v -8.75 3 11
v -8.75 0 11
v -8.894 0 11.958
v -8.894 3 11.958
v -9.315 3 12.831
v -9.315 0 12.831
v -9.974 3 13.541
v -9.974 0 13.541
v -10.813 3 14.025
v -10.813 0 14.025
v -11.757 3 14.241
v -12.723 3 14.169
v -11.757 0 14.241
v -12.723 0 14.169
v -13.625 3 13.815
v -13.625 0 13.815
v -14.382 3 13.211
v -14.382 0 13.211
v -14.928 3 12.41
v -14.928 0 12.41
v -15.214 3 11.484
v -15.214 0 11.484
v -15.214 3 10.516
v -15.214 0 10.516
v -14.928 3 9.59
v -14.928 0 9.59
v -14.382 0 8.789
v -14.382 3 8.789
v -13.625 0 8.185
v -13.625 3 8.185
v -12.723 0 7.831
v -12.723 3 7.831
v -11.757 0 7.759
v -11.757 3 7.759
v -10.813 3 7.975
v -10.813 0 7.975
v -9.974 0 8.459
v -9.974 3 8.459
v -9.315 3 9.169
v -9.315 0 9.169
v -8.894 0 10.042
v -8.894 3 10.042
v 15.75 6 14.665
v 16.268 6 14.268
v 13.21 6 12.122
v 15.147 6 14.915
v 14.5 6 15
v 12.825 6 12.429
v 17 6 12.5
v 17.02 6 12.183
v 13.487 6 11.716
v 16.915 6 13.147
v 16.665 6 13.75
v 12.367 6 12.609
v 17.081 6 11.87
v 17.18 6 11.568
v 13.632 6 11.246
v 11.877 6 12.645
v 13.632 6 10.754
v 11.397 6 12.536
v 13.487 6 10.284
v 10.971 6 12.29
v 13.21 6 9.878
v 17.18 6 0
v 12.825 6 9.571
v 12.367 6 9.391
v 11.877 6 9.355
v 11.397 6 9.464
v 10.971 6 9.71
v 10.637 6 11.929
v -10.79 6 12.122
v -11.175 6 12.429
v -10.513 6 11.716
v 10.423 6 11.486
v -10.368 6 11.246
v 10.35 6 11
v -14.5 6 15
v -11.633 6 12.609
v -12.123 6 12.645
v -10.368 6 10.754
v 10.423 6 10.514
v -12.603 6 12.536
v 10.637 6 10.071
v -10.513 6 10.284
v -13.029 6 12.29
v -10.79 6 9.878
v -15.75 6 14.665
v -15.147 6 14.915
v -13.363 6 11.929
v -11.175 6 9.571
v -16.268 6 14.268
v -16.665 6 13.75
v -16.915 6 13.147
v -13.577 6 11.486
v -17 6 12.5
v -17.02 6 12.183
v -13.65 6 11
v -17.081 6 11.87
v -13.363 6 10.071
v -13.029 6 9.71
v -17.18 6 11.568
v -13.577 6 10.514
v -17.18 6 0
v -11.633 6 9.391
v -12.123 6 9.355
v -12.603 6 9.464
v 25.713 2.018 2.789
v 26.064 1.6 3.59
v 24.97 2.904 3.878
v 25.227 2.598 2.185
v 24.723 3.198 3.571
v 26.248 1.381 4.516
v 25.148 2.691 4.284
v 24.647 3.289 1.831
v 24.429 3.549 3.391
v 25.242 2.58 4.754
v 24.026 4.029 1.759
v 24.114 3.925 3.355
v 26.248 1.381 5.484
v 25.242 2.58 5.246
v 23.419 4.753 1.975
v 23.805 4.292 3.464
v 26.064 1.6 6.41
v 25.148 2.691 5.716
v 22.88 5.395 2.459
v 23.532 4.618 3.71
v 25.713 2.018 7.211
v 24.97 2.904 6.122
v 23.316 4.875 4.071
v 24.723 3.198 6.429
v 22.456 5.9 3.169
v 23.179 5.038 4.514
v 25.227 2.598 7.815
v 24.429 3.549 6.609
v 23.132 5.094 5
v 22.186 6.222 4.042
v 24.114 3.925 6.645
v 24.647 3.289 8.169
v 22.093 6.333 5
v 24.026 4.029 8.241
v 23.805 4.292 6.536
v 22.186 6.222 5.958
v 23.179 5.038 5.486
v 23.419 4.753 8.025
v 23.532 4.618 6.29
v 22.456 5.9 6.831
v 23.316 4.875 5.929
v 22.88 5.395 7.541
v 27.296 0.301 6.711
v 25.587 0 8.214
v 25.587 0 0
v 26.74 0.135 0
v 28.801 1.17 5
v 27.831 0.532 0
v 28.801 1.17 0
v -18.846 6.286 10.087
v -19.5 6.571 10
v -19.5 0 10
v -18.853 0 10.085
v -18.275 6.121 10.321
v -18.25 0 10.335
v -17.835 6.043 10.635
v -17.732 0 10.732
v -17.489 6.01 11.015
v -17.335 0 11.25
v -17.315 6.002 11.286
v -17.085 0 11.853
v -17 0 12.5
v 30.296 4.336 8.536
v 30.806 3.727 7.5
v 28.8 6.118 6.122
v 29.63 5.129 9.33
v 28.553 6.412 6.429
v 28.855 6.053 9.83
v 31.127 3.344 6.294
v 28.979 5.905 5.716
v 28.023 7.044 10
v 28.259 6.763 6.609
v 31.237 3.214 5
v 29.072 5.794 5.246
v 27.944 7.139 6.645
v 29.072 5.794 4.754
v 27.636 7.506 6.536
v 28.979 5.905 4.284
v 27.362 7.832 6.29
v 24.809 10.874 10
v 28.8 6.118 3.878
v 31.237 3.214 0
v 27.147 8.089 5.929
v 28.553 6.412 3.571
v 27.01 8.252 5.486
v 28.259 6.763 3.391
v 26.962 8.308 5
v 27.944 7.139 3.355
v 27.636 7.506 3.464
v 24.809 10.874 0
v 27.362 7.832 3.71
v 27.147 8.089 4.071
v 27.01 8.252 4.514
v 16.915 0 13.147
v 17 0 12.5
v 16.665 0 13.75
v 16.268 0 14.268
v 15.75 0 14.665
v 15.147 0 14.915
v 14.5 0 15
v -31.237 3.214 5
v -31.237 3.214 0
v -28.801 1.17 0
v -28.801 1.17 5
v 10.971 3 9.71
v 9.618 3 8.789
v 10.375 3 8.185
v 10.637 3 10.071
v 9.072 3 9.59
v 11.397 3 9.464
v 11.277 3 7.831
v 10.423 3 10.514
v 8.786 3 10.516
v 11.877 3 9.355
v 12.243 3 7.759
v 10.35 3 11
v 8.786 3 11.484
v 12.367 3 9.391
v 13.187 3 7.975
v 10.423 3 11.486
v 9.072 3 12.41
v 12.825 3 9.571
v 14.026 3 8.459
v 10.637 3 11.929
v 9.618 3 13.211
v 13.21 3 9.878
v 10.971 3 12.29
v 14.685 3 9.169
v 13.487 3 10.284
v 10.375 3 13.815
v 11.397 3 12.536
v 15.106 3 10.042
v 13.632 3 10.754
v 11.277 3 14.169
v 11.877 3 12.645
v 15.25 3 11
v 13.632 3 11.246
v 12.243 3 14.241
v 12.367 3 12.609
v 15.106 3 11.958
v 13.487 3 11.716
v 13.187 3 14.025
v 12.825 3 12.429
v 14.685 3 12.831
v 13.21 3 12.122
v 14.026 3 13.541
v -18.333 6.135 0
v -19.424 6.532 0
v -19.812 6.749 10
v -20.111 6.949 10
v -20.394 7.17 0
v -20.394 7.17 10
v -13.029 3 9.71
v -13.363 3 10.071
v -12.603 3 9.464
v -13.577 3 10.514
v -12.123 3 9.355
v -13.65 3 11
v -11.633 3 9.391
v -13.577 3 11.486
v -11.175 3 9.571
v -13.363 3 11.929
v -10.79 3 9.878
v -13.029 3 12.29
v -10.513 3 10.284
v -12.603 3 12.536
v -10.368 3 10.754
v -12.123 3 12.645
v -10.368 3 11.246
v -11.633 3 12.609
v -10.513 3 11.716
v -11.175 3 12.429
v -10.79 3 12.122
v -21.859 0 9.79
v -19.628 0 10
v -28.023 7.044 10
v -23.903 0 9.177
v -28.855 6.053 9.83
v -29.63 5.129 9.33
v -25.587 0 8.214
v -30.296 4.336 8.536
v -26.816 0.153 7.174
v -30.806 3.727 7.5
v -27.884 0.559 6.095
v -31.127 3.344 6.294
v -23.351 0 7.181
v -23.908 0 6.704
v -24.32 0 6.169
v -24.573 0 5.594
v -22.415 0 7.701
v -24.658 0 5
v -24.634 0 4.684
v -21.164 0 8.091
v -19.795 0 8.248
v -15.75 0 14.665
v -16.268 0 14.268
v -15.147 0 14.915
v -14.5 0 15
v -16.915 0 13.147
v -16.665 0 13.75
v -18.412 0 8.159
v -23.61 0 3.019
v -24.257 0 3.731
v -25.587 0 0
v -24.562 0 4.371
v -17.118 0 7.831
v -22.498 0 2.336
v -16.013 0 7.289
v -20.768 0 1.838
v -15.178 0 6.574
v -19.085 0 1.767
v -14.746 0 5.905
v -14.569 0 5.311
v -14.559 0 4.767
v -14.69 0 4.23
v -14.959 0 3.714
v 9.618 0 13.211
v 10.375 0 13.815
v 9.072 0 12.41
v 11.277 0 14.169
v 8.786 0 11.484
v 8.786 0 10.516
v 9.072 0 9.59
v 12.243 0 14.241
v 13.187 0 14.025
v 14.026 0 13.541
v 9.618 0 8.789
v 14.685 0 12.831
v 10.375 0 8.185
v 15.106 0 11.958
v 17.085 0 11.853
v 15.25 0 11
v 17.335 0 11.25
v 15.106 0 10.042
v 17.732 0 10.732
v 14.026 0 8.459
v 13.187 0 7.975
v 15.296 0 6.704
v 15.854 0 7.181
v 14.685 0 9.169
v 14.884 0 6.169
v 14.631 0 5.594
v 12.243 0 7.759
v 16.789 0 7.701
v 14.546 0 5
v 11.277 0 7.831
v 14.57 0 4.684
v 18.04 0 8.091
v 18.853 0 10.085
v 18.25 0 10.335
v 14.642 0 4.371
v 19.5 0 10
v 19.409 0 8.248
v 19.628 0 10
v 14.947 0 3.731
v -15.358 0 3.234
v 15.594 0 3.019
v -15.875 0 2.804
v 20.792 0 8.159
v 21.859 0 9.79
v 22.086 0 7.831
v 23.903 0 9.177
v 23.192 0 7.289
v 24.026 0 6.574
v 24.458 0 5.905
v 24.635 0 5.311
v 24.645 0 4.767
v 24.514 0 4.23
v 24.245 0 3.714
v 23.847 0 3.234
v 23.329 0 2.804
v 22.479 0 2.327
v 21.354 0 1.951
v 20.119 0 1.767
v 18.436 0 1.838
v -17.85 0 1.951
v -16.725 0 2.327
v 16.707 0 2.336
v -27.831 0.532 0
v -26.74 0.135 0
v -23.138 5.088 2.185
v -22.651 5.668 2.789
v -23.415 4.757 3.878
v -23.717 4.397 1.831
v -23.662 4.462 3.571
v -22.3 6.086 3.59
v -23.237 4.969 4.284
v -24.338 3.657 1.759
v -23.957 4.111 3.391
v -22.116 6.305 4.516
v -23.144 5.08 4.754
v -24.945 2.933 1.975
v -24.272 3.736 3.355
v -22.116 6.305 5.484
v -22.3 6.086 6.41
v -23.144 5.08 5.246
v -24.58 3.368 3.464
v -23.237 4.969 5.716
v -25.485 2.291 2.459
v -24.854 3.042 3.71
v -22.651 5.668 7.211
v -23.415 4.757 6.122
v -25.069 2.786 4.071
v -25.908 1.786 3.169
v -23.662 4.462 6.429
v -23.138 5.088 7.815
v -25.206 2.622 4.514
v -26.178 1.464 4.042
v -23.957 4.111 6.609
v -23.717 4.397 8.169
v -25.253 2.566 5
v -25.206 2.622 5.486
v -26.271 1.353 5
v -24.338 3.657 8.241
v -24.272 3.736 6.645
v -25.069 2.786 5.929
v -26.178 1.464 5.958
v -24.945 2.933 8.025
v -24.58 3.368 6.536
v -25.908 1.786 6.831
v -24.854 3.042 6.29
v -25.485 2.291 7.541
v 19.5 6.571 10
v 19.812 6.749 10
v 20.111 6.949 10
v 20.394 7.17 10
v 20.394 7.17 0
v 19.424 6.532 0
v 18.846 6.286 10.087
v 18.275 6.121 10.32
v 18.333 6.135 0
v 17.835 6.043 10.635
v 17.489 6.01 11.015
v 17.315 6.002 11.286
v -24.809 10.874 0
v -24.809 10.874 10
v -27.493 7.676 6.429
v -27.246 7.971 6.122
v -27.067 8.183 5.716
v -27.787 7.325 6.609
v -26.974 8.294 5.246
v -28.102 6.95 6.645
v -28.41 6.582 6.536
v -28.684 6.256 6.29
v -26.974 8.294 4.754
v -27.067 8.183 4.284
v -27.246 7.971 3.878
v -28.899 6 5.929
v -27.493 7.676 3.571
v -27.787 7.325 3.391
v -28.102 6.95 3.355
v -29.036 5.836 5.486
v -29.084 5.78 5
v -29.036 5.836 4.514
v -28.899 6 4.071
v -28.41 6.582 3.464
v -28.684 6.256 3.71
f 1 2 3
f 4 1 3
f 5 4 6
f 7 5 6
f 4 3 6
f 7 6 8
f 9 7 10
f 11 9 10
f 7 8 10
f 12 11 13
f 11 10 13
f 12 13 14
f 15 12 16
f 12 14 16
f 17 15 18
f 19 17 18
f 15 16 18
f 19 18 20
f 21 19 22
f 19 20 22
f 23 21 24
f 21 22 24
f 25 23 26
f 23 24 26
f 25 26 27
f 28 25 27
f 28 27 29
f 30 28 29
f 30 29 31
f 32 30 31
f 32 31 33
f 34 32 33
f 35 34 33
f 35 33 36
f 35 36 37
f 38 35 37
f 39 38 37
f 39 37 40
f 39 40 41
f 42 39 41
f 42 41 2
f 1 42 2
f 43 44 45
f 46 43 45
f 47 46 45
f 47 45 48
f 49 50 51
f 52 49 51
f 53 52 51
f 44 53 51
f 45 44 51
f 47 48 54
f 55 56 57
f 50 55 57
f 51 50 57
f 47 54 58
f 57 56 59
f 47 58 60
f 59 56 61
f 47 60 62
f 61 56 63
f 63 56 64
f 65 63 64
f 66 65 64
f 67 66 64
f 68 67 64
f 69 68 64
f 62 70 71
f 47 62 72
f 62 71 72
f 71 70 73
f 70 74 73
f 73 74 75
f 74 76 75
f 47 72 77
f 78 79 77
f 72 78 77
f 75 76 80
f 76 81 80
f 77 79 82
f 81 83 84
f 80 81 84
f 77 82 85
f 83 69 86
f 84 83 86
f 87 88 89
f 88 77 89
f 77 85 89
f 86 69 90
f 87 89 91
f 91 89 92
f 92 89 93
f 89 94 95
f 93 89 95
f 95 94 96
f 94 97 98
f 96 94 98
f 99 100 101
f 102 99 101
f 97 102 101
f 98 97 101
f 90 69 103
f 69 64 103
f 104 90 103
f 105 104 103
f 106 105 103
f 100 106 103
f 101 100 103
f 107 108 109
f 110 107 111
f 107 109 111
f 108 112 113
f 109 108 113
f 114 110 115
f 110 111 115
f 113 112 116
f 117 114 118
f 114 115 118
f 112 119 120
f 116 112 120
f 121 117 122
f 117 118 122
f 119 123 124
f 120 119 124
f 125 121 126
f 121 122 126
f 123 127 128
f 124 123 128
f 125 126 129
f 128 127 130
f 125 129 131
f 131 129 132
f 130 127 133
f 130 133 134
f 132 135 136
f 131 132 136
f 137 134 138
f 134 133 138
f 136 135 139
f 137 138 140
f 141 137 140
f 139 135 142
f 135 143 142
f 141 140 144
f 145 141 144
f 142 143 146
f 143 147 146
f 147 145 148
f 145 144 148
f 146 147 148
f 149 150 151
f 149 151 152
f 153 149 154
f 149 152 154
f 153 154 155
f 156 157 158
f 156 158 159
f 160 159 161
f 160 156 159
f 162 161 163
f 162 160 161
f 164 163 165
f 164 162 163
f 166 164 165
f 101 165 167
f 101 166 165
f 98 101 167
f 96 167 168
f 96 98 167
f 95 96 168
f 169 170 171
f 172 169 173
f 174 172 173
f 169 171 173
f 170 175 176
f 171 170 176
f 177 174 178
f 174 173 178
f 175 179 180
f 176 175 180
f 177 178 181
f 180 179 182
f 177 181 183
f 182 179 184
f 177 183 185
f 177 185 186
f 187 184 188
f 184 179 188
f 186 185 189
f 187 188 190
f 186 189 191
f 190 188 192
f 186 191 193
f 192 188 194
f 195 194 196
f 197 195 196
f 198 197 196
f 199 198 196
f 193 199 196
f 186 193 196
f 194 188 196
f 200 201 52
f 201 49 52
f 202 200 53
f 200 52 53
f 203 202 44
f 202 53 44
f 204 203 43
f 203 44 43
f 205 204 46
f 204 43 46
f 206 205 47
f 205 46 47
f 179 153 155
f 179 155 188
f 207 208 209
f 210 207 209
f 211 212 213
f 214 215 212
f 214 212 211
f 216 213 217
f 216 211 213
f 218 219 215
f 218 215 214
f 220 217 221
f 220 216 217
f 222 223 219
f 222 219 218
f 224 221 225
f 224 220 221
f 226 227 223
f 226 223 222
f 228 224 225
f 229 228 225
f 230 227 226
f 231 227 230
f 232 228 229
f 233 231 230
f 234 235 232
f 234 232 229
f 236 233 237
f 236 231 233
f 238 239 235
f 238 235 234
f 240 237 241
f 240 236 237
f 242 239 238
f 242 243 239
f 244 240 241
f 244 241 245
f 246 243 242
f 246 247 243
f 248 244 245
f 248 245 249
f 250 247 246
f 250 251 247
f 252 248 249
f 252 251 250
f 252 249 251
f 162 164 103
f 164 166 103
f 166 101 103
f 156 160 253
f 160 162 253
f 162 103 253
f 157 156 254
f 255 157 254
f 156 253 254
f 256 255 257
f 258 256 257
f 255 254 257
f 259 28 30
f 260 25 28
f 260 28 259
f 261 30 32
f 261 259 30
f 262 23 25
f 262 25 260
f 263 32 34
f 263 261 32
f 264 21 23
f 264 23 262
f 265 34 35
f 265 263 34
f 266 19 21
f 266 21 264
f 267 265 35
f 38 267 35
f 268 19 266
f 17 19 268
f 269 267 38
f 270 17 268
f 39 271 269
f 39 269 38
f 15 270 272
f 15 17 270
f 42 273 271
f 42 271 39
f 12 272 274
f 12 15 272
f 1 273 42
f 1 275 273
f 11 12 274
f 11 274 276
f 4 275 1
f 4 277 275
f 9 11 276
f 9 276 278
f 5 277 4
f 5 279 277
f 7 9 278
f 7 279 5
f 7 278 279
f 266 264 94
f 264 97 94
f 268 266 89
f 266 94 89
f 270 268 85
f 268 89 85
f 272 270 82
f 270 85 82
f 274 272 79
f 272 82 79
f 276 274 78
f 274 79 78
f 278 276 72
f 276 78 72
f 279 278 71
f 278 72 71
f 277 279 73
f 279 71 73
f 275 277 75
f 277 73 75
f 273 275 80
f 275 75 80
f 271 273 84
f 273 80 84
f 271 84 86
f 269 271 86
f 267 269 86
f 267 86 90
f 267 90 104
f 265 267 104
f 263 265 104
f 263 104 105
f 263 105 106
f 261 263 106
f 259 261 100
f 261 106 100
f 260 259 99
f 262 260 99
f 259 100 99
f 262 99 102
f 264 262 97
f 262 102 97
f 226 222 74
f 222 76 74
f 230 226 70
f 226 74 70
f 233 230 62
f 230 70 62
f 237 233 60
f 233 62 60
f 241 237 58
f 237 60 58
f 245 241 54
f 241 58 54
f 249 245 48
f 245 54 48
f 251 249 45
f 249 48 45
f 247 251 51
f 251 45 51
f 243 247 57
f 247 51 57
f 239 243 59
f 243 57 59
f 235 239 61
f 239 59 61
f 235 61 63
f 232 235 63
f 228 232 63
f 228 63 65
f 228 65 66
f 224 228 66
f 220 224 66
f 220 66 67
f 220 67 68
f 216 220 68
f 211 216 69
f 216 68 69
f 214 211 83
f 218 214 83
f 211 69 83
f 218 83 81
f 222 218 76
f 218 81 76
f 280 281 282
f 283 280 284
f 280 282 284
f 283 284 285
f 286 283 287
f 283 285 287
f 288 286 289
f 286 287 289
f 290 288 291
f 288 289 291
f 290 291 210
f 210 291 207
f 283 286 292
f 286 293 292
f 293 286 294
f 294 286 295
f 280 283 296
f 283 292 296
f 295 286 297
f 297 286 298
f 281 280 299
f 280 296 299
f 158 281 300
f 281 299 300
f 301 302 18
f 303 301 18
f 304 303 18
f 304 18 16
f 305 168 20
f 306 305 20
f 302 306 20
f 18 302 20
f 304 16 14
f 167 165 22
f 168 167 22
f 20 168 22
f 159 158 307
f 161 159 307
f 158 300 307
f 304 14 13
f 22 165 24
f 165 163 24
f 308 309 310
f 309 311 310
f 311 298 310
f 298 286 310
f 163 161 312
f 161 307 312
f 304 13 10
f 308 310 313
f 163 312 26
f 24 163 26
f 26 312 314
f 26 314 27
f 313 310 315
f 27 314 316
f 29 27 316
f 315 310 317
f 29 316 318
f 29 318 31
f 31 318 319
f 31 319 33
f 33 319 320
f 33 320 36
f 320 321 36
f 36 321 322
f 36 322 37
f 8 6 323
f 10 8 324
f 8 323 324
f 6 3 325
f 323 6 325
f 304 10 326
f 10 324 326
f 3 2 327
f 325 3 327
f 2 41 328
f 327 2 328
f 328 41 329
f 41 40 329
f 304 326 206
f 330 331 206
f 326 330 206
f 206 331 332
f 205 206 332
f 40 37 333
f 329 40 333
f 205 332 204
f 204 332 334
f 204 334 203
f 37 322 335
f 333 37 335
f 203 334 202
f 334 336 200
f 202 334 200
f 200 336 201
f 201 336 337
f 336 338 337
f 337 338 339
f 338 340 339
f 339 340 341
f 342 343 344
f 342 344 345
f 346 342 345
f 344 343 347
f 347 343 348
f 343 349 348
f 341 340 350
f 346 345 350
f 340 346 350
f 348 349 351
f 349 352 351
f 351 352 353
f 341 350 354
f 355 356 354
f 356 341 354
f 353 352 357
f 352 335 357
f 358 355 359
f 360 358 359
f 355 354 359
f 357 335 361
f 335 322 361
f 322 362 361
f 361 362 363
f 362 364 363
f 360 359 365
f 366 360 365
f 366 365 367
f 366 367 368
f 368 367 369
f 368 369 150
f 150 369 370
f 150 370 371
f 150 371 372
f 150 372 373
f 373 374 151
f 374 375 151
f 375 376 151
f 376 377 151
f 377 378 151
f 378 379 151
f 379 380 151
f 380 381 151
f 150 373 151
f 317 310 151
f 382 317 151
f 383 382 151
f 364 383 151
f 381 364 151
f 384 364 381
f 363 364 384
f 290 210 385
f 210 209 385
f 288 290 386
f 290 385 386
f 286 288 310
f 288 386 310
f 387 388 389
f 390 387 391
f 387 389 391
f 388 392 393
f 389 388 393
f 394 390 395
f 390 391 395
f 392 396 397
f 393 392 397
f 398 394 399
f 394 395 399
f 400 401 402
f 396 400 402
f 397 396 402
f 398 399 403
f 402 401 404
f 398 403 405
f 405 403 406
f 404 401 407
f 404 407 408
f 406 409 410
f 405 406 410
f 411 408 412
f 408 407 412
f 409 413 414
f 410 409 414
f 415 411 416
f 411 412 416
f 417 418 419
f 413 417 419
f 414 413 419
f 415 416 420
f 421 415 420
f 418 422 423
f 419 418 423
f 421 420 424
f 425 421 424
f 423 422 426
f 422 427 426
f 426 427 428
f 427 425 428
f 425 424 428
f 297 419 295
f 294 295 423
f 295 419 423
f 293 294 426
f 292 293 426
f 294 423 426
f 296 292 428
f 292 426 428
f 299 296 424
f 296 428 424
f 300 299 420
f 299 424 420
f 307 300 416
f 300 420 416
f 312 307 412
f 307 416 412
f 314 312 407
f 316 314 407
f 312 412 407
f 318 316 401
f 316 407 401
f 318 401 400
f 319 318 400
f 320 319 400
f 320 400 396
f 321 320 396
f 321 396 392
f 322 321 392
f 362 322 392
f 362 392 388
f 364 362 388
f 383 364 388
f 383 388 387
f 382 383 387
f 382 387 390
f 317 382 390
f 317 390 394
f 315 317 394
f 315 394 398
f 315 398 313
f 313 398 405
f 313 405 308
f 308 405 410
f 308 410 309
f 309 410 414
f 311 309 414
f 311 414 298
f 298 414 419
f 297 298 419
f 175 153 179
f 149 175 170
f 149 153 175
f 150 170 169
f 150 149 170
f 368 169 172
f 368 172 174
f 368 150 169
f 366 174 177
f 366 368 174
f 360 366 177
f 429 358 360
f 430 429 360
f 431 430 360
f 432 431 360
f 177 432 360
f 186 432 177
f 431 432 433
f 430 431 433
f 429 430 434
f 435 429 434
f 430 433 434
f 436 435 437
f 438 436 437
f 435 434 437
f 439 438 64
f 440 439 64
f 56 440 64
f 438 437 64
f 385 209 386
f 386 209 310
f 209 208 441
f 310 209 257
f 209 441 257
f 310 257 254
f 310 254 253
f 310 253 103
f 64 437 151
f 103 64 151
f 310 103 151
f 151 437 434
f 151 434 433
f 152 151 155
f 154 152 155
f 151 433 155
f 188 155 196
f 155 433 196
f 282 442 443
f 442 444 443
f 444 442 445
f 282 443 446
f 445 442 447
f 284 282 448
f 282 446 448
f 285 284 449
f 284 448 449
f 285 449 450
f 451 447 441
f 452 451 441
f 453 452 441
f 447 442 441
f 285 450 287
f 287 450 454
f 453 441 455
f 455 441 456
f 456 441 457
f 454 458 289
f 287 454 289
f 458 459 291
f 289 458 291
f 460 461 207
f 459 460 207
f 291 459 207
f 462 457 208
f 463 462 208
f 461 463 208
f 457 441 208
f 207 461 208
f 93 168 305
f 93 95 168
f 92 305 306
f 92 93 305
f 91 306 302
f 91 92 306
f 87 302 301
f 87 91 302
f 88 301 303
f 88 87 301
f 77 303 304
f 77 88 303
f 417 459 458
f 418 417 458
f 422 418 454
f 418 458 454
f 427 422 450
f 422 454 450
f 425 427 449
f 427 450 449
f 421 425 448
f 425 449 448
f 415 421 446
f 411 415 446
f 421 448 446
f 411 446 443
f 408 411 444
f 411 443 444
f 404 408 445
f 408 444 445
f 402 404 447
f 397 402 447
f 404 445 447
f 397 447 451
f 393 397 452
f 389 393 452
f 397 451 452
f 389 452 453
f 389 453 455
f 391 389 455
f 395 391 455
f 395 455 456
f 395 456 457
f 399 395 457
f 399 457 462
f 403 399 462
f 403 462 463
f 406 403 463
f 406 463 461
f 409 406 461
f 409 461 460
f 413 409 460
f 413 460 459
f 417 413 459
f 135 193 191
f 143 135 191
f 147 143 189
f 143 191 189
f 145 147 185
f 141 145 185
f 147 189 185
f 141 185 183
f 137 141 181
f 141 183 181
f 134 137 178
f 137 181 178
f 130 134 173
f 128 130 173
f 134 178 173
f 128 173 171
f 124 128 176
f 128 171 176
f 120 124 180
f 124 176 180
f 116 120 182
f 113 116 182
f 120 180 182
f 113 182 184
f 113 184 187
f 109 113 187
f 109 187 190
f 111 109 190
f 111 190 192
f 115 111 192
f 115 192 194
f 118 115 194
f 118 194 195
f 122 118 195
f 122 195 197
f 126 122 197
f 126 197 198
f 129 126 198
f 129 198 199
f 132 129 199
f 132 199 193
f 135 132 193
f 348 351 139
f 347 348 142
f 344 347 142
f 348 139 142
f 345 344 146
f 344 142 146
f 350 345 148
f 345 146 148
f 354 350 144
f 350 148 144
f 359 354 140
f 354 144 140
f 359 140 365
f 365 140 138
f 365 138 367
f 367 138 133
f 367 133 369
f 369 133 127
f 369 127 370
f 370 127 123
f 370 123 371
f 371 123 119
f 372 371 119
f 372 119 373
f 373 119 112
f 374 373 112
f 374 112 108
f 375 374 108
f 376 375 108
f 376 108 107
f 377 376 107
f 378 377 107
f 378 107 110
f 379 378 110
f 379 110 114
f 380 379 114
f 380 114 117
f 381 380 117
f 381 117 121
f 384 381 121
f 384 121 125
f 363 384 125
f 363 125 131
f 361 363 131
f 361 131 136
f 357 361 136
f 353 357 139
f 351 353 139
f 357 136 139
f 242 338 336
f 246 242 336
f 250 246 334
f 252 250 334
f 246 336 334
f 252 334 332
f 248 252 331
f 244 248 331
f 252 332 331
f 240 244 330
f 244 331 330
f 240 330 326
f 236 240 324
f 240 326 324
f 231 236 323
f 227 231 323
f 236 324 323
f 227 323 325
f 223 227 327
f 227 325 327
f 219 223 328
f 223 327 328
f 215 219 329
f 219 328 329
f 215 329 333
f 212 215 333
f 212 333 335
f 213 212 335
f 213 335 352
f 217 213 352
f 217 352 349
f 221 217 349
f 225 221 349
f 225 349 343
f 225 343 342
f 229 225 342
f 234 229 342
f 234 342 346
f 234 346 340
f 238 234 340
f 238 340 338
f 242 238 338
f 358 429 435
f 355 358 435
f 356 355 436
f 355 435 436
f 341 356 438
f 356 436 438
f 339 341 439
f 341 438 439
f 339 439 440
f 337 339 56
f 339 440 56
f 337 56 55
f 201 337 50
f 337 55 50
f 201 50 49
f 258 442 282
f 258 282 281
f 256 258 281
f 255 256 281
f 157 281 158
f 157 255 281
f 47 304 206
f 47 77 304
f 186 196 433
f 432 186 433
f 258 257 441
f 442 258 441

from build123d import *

# Parameters (mm, degrees)
F1_DEPTH       = 10
F2_W           = 34
F2_H           = 6
F3_DEPTH       = 5
F5_R           = 2.49999
F6_D           = 3.3
F6_CBORE_D     = 6.5
F6_CBORE_DEPTH = 3
F7_T1_DEPTH    = 28.1801488287
F7_T3_DEPTH    = 28.1801488287
F8_R           = 1.65
F9_DEPTH       = 49.9246466694
F10_R          = 1.65
F11_DEPTH      = 49.9246466694
F13_R          = 3.25
F14_DEPTH      = 25
F16_R          = 3.25
F17_DEPTH      = 25


# Not quite as in the source:
# - a fillet or chamfer that OpenCascade refuses, or shapes differently, is made with other operations: its cross-section is extruded or revolved along the edge and cut away or added
# - a fillet or chamfer is up to 0.001 mm smaller than in the source, because OpenCascade refuses the exact size


with BuildPart() as f1:
    # F0 (on Top) → F1 (new body)
    with BuildSketch(Plane.XY):
        with BuildLine():
            Line((-25.5868655417, 0), (0, 0))
            Line((0, 0), (25.5868655417, 0))
            ThreePointArc((25.5868655417, 0), (27.2969662583, 0.3015368961), (28.8008035901, 1.1697777844))
            Line((28.8008035901, 1.1697777844), (31.2369389286, 3.2139380484))
            Line((31.2369389286, 3.2139380484), (24.8090628318, 10.8743824796))
            Line((24.8090628318, 10.8743824796), (20.3940868771, 7.1697777844))
            ThreePointArc((20.3940868771, 7.1697777844), (18.8902495453, 6.3015368961), (17.1801488287, 6))
            Line((17.1801488287, 6), (0, 6))
            Line((0, 6), (-17.1801488287, 6))
            ThreePointArc((-17.1801488287, 6), (-18.8902495453, 6.3015368961), (-20.3940868771, 7.1697777844))
            Line((-20.3940868771, 7.1697777844), (-24.8090628318, 10.8743824796))
            Line((-24.8090628318, 10.8743824796), (-31.2369389286, 3.2139380484))
            Line((-31.2369389286, 3.2139380484), (-28.8008035901, 1.1697777844))
            ThreePointArc((-28.8008035901, 1.1697777844), (-27.2969662583, 0.3015368961), (-25.5868655417, 0))
        make_face()
    extrude(amount=F1_DEPTH)

    # F2 (on face) → F3 (join)
    with BuildSketch(Plane.XY.offset(10)):
        with Locations((0, 3)):
            Rectangle(F2_W, F2_H)
    extrude(amount=F3_DEPTH)

    # F5 (radius 2.5 in the source; OpenCascade refuses exactly that, so slightly less here)
    f5_edges = [f1.edges().sort_by_distance(p)[0] for p in [
        (17, 3, 10),
        (17, 3, 15),
        (-17, 3, 15),
        (-17, 3, 10),
    ]]
    fillet(f5_edges, radius=F5_R)

    # F6 (through all)
    with Locations(Plane.XZ):
        with Locations((-12, 11), (12, 11)):
            CounterBoreHole(F6_D / 2, F6_CBORE_D / 2, F6_CBORE_DEPTH)

    # F7: fillet of radius 5 on 2 edges, made by hand

    # F7_s2 → F7_t1 (cut)
    with BuildSketch(Plane(origin=(-29.4886993176, 24.7439567213, 0), x_dir=(0, 0, 1), z_dir=(0.7660444431, -0.6427876097, 0))):
        with BuildLine():
            ThreePointArc((10, 12.6166979253), (8.5355339059, 16.1522318313), (5, 17.6166979253))
            Line((5, 17.6166979253), (10, 17.6166979253))
            Line((10, 17.6166979253), (10, 12.6166979253))
        make_face()
    extrude(amount=F7_T1_DEPTH, mode=Mode.SUBTRACT)

    # F7_s4 → F7_t3 (cut)
    with BuildSketch(Plane(origin=(7.9014529012, 6.6301062151, 0), x_dir=(0, 0, 1), z_dir=(0.7660444431, 0.6427876097, 0))):
        with BuildLine():
            ThreePointArc((5, 17.6166979253), (8.5355339059, 16.1522318313), (10, 12.6166979253))
            Line((10, 12.6166979253), (10, 17.6166979253))
            Line((10, 17.6166979253), (5, 17.6166979253))
        make_face()
    extrude(amount=F7_T3_DEPTH, mode=Mode.SUBTRACT)

    # F8 (on face) → F9 (cut, through all)
    with BuildSketch(Plane(origin=(19.9131437786, 16.7091116002, 0), x_dir=(-0.6427876097, 0.7660444431, 0), z_dir=(0.7660444431, 0.6427876097, 0))):
        with Locations((-12.6166979253, 5)):
            Circle(F8_R)
    extrude(amount=-F9_DEPTH, mode=Mode.SUBTRACT)

    # F10 (on face) → F11 (cut, through all)
    with BuildSketch(Plane(origin=(-19.9131437786, 16.7091116002, 0), x_dir=(-0.6427876097, -0.7660444431, 0), z_dir=(-0.7660444431, 0.6427876097, 0))):
        with Locations((12.6166979253, 5)):
            Circle(F10_R)
    extrude(amount=-F11_DEPTH, mode=Mode.SUBTRACT)

    # F13 (on offset) → F14 (cut)
    with BuildSketch(Plane(origin=(16.082921563, 13.4951735518, 0), x_dir=(-0.6427876097, 0.7660444431, 0), z_dir=(0.7660444431, 0.6427876097, 0))):
        with Locations((-12.6, 5)):
            Circle(F13_R)
    extrude(amount=-F14_DEPTH, mode=Mode.SUBTRACT)

    # F16 (on offset) → F17 (cut)
    with BuildSketch(Plane(origin=(-16.082921563, 13.4951735518, 0), x_dir=(-0.6427876097, -0.7660444431, 0), z_dir=(-0.7660444431, 0.6427876097, 0))):
        with Locations((12.6, 5)):
            Circle(F16_R)
    extrude(amount=-F17_DEPTH, mode=Mode.SUBTRACT)


solid = f1.part
